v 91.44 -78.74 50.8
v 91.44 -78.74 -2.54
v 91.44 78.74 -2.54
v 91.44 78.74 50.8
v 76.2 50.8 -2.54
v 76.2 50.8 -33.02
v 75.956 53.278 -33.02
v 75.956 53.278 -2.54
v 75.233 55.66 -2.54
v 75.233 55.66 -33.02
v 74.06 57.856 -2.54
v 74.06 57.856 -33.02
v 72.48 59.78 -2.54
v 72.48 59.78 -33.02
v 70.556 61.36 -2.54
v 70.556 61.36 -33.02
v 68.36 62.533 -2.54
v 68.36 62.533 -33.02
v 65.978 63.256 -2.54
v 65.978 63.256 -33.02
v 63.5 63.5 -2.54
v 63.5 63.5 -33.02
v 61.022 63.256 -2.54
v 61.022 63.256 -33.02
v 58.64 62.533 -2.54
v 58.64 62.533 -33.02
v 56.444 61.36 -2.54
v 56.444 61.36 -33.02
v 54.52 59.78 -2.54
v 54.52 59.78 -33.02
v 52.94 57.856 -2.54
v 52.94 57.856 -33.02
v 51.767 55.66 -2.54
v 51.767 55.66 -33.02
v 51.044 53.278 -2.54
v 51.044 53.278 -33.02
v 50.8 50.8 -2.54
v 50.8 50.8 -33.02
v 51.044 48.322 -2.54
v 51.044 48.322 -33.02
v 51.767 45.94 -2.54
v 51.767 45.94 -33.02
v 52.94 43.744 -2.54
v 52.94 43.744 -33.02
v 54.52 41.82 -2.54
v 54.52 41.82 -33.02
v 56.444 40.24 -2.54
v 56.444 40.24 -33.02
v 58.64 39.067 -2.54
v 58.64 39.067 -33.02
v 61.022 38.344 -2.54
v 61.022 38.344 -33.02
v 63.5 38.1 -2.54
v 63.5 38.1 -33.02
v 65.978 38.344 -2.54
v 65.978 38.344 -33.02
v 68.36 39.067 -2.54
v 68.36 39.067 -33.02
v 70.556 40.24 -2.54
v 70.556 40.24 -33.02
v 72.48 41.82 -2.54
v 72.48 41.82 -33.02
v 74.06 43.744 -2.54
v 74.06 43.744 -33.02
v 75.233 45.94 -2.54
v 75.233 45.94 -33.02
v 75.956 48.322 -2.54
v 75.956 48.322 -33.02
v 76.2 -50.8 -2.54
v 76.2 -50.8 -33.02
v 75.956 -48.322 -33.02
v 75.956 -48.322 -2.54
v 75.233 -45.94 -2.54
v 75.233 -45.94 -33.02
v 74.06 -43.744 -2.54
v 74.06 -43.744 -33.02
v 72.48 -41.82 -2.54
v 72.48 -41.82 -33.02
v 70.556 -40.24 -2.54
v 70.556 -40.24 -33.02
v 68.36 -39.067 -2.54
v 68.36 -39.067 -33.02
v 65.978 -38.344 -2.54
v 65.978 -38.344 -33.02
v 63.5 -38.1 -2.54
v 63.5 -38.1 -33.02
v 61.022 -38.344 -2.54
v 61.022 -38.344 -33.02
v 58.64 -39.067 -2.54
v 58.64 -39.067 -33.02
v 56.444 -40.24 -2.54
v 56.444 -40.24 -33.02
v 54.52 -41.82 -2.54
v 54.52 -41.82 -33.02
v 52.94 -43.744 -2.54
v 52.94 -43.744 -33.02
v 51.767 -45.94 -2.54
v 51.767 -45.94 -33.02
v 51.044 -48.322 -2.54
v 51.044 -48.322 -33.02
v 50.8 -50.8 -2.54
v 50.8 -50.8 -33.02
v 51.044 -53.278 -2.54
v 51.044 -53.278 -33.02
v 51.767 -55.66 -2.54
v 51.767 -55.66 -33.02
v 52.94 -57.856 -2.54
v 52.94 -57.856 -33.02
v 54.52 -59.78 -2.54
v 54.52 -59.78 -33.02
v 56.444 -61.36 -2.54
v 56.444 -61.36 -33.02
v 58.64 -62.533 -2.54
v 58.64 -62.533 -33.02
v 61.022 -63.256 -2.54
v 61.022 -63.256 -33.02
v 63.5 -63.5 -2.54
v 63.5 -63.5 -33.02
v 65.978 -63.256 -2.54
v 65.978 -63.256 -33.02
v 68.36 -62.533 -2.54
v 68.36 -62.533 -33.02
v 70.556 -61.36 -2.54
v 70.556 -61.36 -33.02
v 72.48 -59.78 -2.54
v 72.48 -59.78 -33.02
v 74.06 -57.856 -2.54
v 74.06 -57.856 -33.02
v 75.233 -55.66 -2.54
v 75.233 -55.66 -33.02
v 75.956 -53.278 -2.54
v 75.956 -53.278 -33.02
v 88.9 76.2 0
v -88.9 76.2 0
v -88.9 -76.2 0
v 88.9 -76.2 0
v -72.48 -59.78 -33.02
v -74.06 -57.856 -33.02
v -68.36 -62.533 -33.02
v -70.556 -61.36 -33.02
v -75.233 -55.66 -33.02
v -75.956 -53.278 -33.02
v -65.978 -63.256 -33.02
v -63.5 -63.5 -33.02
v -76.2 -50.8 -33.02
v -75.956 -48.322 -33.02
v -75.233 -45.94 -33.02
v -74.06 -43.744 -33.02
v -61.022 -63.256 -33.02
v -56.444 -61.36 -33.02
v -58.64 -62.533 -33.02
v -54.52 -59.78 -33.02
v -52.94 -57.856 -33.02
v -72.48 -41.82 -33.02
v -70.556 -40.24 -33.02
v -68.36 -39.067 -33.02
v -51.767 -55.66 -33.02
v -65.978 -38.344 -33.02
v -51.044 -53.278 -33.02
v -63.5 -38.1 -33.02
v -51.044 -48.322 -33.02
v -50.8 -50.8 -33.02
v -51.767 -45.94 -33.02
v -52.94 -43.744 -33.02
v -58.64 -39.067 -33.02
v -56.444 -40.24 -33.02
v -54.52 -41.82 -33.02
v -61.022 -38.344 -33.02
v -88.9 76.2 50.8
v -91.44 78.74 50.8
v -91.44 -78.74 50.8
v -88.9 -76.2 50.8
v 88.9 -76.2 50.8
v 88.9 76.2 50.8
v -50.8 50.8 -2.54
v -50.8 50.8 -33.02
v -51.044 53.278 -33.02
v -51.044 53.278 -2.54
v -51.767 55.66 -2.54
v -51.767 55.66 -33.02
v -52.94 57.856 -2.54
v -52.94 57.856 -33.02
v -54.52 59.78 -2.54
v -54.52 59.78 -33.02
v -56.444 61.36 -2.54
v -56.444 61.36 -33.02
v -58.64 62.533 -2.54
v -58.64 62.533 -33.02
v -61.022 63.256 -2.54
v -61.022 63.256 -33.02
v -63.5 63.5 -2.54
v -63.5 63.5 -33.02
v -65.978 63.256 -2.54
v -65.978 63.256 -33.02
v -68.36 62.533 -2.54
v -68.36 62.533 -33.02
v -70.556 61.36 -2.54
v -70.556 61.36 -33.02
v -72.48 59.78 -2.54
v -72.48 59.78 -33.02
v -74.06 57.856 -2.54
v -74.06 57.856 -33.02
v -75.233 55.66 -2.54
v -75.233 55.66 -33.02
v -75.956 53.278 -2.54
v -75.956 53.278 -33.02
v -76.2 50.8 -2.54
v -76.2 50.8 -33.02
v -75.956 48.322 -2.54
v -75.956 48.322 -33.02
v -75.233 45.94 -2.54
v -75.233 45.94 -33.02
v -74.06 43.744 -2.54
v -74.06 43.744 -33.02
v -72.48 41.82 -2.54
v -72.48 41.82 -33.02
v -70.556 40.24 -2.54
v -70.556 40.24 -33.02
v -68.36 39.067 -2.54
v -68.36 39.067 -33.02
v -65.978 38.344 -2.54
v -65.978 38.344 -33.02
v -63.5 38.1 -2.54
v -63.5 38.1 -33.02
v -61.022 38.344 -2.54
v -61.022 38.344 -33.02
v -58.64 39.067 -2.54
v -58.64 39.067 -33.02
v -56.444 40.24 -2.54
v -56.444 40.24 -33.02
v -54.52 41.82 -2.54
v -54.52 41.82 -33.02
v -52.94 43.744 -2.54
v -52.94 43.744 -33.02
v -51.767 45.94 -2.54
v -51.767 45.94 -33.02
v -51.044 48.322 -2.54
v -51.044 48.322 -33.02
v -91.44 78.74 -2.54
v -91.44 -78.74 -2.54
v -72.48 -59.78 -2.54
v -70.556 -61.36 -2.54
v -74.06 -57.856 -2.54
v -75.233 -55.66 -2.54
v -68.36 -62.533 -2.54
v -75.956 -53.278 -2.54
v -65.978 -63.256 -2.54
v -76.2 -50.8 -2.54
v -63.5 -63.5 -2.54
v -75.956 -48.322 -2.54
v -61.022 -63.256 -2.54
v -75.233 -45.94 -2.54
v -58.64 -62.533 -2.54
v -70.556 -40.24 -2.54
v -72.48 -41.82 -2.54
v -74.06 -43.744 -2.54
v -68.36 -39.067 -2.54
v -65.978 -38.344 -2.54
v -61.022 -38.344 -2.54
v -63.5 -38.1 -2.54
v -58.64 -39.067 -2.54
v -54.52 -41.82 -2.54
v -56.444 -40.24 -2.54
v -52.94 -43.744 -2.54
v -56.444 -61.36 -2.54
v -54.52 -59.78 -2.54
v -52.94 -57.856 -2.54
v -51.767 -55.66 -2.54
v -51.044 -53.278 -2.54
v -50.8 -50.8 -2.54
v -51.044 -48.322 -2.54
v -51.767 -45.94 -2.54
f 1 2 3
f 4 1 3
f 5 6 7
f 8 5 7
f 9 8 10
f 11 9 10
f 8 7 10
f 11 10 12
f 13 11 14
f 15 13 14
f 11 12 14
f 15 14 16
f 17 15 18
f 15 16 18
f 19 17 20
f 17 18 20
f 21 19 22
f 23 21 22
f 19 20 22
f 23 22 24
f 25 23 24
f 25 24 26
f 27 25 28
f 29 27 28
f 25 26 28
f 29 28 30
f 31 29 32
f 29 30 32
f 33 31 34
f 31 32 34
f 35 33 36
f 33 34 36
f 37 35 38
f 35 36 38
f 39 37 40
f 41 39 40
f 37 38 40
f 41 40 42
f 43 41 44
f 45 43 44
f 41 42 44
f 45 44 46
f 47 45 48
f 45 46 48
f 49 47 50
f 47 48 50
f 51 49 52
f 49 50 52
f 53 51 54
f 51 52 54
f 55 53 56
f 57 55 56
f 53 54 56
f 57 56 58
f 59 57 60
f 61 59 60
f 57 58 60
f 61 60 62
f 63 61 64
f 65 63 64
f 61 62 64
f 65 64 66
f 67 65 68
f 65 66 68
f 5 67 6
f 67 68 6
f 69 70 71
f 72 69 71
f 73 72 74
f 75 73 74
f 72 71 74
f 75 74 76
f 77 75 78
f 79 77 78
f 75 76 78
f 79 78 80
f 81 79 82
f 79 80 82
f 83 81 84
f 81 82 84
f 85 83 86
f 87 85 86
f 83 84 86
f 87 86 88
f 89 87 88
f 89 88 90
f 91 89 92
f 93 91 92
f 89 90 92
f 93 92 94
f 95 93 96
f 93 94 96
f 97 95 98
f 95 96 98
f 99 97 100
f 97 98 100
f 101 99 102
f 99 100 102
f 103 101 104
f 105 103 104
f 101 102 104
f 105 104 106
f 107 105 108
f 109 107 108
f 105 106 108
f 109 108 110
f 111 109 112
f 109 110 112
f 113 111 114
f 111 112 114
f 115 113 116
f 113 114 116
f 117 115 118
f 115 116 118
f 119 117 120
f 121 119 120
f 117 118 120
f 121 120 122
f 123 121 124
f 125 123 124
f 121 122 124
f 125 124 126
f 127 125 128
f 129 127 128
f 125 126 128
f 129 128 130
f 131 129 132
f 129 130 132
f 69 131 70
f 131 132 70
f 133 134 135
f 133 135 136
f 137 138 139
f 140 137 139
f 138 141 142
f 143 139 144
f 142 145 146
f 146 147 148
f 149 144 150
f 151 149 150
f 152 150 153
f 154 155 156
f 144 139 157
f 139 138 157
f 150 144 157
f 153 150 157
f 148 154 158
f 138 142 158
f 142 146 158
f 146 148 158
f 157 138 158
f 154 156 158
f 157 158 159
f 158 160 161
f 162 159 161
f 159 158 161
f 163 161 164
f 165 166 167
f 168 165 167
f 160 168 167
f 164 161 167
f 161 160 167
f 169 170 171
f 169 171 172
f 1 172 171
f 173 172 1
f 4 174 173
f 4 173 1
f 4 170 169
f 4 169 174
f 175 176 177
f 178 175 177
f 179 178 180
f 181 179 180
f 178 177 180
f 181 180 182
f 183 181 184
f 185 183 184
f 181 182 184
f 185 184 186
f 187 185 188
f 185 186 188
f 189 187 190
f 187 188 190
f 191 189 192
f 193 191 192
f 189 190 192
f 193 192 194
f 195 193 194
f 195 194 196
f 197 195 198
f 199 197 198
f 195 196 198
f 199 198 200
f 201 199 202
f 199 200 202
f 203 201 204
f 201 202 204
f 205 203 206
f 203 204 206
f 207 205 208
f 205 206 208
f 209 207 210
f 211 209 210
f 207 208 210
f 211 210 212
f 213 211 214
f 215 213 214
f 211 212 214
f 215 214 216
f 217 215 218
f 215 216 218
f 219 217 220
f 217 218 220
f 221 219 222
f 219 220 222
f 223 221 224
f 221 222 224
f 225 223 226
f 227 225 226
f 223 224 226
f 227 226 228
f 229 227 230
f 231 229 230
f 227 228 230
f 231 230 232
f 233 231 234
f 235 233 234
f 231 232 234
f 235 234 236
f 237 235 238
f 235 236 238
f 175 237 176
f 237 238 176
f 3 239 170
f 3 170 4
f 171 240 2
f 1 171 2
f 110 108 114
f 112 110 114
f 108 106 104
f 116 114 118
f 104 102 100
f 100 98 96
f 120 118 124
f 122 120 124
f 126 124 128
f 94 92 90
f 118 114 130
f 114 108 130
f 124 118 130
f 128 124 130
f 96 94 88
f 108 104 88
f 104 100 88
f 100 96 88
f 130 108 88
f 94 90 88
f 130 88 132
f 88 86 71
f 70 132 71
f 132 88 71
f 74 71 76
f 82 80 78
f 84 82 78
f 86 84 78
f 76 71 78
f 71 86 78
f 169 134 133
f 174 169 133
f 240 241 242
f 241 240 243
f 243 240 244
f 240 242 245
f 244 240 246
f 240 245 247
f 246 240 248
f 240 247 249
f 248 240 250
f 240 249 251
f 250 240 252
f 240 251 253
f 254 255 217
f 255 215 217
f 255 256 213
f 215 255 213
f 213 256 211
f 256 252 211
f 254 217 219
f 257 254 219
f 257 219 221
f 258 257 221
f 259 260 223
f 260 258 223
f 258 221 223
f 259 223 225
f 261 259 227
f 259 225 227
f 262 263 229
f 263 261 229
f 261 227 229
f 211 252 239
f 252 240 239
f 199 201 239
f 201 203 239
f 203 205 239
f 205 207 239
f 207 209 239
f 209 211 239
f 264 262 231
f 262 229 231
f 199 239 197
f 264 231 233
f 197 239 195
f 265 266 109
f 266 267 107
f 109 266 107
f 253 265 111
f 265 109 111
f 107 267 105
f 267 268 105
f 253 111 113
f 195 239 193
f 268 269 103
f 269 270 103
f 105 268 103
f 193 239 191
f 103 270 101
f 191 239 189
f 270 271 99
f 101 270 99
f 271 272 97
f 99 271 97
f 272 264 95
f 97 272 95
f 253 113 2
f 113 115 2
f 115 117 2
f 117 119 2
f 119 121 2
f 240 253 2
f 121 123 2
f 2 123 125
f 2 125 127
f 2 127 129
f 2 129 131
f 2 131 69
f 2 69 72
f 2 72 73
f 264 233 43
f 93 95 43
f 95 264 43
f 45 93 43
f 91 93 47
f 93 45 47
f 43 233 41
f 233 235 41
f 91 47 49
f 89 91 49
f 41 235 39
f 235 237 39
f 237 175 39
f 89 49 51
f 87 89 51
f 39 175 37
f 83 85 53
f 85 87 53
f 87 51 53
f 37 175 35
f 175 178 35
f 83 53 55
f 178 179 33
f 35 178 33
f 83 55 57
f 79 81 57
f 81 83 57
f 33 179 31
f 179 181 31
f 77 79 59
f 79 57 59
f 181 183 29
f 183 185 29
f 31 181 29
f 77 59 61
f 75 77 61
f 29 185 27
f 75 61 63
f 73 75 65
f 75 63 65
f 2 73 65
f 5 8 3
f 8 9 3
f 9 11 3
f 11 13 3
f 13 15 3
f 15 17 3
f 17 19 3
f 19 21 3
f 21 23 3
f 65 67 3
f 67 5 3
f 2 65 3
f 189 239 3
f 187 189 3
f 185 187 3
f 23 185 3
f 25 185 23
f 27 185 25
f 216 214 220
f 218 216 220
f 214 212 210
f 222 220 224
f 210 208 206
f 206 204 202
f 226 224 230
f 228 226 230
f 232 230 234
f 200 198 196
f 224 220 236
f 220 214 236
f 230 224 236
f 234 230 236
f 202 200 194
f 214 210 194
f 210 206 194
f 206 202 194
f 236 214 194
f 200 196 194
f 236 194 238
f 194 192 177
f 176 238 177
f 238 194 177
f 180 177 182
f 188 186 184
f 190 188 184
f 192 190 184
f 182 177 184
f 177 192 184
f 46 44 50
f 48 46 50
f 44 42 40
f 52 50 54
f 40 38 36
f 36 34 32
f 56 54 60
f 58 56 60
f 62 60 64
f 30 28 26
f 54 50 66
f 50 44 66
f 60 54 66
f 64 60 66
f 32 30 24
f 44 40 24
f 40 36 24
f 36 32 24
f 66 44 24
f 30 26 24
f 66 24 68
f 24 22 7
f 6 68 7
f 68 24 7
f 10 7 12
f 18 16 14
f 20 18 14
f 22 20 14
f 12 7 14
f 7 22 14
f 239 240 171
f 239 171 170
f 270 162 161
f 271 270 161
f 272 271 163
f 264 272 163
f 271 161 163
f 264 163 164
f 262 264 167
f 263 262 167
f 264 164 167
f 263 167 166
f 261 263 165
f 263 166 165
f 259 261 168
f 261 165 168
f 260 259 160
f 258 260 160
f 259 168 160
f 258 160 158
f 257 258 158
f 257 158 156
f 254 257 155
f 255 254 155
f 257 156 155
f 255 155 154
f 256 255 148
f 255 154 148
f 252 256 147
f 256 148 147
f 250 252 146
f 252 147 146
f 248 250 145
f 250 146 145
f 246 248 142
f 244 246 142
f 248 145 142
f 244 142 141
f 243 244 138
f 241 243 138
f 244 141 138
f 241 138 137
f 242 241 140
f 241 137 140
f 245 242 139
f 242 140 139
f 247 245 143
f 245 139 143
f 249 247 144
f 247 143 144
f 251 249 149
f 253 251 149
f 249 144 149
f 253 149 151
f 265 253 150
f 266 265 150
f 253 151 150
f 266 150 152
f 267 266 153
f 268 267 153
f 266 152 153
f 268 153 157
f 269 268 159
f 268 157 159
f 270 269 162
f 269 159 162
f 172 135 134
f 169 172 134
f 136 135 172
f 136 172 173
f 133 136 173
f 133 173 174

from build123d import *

# Parameters (mm, degrees)
SKETCH2_W               = 177.8
SKETCH2_H               = 152.4
BOSS_EXTRUDE1_DEPTH     = 50.8
SHELL2_T                = 2.54
BOSS_EXTRUDE3_START     = -33.02
BOSS_EXTRUDE3_OUTLINE_R = 12.7
BOSS_EXTRUDE3_DEPTH     = 30.48


# Read off the part's stored shape, not the designer's step: Boss-Extrude3
with BuildPart() as part:
    # Sketch2 → Boss-Extrude1 (new body)
    with BuildSketch(Plane.XY):
        Rectangle(SKETCH2_W, SKETCH2_H)
    extrude(amount=BOSS_EXTRUDE1_DEPTH)

    # Shell2
    shell2_openings = [part.faces().sort_by_distance(p)[0] for p in [
        (0, 0, 50.8),
    ]]
    offset(amount=SHELL2_T, openings=shell2_openings, kind=Kind.INTERSECTION)

    # Boss-Extrude3 outline → Boss-Extrude3 (add)
    with BuildSketch(Plane.XY.offset(BOSS_EXTRUDE3_START)):
        with Locations((-63.5, -50.8)):
            Circle(BOSS_EXTRUDE3_OUTLINE_R)
        with Locations((63.5, -50.8)):
            Circle(BOSS_EXTRUDE3_OUTLINE_R)
        with Locations((63.5, 50.8)):
            Circle(BOSS_EXTRUDE3_OUTLINE_R)
        with Locations((-63.5, 50.8)):
            Circle(BOSS_EXTRUDE3_OUTLINE_R)
    extrude(amount=BOSS_EXTRUDE3_DEPTH)


solid = part.part
